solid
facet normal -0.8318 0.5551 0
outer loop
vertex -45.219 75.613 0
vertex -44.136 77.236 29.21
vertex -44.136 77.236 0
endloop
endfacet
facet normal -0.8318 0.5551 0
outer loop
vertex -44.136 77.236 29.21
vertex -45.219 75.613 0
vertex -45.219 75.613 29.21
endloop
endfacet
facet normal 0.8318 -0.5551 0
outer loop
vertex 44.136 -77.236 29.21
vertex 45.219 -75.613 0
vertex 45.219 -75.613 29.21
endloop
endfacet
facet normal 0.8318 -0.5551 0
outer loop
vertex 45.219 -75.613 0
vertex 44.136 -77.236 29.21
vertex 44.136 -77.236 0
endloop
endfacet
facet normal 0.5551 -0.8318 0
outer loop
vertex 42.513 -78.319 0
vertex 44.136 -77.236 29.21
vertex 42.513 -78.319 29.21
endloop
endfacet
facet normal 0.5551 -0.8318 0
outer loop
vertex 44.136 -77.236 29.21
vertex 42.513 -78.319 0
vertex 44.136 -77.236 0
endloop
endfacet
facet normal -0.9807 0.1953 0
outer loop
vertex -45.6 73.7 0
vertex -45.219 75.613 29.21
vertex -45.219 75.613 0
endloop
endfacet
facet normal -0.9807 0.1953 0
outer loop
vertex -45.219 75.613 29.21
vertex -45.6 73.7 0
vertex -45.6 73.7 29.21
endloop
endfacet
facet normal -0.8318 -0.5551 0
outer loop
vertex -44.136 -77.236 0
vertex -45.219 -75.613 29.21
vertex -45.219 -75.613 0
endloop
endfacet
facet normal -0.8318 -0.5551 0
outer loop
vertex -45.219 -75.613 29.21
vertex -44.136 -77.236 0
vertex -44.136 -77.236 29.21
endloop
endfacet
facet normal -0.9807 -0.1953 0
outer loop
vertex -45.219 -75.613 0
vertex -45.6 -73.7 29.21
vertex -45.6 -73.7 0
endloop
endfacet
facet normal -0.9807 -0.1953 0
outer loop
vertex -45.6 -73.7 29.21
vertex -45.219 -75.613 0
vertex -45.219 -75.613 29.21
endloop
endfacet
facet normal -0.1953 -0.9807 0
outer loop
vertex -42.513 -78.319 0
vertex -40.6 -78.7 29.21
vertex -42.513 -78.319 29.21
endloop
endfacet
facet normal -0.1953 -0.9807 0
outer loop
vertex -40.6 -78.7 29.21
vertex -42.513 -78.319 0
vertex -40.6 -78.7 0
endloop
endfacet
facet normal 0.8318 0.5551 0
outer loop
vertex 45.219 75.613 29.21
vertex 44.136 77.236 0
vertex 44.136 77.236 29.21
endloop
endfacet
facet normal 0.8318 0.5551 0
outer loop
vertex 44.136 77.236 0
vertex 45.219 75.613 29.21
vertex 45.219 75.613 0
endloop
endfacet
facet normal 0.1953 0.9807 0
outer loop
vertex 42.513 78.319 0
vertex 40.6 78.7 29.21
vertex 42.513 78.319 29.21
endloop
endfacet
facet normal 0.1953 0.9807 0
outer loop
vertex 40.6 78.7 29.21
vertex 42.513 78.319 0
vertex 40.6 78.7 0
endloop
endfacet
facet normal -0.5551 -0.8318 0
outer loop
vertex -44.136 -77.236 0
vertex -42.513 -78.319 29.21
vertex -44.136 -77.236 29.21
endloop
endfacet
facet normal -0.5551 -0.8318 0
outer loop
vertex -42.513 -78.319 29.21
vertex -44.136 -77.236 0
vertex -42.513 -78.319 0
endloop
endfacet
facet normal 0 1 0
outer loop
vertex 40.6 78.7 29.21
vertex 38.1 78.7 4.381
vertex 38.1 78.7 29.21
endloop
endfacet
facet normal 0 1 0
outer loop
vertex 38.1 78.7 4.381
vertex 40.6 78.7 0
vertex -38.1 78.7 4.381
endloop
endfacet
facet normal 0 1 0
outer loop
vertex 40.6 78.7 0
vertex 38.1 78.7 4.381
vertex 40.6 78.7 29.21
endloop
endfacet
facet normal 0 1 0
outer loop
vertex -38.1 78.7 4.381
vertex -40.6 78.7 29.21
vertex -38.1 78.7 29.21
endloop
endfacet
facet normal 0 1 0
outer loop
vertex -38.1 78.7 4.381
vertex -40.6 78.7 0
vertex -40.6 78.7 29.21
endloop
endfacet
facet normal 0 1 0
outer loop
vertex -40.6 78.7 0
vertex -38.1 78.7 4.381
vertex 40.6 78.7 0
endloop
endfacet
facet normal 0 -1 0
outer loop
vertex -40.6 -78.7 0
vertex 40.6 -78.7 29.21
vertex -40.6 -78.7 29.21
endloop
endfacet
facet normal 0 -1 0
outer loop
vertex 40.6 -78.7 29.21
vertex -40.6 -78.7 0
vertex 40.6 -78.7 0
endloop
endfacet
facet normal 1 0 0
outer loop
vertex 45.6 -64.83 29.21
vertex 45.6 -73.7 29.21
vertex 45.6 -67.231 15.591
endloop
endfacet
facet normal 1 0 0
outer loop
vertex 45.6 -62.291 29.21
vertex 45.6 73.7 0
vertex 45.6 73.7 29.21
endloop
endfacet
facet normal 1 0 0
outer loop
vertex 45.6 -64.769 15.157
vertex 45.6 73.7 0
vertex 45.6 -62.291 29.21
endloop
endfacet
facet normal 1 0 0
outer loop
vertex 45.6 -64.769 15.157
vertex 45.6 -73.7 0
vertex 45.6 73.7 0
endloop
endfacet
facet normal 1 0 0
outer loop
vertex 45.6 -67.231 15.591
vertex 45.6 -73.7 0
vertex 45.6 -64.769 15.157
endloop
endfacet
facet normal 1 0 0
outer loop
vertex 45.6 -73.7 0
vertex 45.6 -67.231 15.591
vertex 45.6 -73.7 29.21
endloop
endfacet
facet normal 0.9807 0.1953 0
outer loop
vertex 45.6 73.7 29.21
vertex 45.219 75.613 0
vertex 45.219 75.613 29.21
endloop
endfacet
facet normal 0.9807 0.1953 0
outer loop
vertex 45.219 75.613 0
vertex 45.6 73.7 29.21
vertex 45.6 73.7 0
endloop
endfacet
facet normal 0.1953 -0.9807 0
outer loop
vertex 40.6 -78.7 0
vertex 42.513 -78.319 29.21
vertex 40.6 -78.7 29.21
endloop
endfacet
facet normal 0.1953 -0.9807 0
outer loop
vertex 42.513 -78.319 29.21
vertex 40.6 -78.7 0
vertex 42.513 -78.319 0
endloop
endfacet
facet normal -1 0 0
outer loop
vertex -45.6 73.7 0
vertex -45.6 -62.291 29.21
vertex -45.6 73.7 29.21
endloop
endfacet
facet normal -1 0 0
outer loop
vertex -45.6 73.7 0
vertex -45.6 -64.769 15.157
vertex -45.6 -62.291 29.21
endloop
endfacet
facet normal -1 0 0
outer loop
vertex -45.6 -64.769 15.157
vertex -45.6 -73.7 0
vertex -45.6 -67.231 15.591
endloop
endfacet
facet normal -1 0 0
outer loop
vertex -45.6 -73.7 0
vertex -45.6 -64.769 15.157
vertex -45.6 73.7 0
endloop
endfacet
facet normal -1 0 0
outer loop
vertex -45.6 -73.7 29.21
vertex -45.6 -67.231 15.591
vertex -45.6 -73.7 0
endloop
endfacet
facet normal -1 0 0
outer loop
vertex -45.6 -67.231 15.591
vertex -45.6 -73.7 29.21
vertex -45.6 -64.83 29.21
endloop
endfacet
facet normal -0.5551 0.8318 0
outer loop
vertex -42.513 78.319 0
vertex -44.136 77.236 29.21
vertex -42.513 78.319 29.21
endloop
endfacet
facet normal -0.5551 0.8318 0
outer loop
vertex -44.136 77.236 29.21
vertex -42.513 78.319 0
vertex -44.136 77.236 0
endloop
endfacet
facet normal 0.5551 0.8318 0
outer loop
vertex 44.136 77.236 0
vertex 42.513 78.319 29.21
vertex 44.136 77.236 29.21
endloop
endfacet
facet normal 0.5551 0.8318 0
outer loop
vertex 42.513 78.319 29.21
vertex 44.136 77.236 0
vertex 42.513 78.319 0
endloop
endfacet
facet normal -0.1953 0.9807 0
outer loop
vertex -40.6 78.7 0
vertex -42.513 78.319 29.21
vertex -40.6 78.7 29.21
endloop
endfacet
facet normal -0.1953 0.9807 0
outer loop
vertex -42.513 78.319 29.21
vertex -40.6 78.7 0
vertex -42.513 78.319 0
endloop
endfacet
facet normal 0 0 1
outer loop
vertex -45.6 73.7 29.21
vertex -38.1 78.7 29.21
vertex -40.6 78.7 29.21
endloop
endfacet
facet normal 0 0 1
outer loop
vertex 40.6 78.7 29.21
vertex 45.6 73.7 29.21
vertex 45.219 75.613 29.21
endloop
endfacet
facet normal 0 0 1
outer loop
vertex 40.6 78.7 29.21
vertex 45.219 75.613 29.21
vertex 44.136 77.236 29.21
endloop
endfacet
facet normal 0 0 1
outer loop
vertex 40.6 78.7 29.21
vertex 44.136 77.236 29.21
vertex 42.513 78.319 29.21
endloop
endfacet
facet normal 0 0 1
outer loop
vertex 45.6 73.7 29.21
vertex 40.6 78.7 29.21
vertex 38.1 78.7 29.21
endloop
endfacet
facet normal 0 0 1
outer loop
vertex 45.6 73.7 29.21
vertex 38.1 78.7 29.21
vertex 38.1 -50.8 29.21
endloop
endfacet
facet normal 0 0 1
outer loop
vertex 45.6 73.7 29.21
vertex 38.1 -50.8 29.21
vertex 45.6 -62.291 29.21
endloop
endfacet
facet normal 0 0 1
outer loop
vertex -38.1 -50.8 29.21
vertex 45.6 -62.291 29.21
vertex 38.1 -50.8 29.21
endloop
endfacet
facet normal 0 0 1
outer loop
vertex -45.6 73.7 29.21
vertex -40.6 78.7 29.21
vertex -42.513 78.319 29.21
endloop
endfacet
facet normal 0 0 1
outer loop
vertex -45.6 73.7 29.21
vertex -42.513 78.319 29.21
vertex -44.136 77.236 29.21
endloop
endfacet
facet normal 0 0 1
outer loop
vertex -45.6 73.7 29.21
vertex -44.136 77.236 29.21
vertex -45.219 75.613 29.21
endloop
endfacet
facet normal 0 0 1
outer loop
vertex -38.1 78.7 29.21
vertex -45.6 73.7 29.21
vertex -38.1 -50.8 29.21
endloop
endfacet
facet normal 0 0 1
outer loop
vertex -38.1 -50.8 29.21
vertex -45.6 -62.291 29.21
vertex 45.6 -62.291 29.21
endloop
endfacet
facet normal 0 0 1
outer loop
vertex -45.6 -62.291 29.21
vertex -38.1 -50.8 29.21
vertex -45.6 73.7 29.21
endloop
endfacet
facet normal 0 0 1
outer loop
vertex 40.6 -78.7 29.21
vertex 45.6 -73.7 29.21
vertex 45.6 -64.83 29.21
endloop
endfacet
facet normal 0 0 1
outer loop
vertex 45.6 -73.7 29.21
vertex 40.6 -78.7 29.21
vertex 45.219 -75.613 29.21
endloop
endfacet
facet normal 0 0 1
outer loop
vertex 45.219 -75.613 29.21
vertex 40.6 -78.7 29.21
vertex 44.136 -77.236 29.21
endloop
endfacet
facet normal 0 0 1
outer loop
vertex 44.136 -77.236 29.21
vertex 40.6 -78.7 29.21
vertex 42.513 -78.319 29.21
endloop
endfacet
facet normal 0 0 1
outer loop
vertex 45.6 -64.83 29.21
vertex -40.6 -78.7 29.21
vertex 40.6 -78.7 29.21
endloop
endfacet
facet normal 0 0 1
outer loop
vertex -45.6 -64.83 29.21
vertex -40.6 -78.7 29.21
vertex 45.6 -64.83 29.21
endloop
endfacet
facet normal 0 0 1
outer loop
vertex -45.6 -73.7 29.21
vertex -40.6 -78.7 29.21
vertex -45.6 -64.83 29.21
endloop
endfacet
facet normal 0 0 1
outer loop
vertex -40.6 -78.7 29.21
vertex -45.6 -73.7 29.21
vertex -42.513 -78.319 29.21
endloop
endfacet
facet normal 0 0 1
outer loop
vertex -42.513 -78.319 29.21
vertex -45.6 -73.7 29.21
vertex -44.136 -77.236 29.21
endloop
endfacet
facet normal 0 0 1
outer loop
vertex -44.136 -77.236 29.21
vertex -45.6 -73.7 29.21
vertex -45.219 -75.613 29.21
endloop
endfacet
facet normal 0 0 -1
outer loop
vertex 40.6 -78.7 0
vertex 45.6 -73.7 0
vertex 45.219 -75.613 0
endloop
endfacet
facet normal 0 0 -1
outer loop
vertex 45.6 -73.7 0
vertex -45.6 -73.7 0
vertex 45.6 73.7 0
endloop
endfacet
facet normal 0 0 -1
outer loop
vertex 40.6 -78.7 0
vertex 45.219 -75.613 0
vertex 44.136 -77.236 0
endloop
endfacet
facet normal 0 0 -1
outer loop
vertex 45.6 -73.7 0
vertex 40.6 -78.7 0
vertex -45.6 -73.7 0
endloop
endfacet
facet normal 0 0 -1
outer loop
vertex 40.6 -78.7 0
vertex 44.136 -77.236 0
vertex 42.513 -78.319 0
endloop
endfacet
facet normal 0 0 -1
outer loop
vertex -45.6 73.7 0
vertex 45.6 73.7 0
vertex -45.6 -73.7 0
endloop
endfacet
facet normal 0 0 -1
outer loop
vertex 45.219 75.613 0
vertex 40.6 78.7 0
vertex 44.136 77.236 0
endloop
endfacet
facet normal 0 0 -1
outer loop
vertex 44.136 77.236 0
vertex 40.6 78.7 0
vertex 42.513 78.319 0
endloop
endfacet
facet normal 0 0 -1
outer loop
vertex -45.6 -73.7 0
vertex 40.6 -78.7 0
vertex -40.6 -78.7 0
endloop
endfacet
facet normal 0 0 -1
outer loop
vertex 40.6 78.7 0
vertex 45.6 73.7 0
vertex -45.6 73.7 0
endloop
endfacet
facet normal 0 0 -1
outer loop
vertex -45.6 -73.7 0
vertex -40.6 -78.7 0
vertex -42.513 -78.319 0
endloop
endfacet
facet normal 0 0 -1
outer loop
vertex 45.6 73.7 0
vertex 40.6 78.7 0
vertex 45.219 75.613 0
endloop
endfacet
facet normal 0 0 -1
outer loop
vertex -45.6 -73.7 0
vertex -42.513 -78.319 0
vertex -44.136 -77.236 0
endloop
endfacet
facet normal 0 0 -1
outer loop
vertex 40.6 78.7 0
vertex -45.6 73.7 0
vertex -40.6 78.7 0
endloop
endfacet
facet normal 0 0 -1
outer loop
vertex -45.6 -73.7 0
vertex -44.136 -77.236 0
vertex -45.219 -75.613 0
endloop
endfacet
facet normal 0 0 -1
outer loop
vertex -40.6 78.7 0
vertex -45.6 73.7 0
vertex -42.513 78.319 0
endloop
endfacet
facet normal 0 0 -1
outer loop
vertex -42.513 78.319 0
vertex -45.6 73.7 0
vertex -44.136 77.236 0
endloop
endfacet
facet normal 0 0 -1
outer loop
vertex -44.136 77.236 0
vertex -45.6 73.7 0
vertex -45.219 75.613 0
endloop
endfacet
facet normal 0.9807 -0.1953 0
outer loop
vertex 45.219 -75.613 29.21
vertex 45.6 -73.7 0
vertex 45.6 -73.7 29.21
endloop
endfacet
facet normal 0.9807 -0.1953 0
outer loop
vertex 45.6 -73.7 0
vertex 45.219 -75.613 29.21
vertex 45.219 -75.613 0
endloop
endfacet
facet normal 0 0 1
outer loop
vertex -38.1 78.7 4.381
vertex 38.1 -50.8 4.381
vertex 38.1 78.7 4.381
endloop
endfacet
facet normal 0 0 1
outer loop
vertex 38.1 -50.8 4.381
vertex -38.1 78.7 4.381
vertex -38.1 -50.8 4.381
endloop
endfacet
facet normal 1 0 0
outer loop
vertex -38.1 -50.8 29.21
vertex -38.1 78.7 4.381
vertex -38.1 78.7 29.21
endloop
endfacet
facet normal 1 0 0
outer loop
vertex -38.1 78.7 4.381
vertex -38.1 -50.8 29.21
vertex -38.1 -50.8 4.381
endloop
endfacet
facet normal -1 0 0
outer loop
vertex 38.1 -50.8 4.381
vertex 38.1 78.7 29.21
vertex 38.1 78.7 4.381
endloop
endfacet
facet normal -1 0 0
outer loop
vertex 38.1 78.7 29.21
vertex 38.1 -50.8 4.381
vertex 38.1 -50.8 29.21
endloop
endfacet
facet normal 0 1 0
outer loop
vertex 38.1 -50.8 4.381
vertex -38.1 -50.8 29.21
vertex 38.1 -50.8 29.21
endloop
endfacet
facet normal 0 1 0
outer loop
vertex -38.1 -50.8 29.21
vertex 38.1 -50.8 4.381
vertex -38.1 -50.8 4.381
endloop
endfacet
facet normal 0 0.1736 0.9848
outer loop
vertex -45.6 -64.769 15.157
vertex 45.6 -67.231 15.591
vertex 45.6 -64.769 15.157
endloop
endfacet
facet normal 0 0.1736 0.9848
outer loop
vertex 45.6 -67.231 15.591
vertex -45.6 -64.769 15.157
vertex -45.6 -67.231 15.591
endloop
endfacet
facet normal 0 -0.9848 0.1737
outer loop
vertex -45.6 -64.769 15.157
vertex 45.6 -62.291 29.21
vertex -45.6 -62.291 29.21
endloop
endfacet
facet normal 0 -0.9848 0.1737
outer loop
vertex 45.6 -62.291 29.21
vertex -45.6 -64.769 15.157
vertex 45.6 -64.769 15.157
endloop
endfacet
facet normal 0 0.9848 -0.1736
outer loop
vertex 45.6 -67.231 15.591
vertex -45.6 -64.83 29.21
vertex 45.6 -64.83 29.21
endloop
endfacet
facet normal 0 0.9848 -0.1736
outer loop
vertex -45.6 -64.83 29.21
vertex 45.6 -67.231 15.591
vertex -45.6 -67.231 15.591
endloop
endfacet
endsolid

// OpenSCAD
mm = 25.4;
card_width_in = 3;
card_height_in = 5;
card_width = card_width_in * mm;
card_height = card_height_in * mm;

width_buffer = 5; // mm on either side of card
height_buffer_in = 1;
height_buffer = height_buffer_in * mm;

full_width = card_width + (2 * width_buffer);
full_height = card_height + height_buffer;

// Card Holder Dimensions: 6.25" x 3.55" x 1.15"
// 3 x 5 cards
depth_z_in = 1.15;
depth_z = depth_z_in * mm;

holder_gap = 2.5;

round_radius = 5;

difference()
{
    linear_extrude(depth_z){
        offset(r = round_radius){square([ full_width - round_radius, full_height - round_radius ], center = true);
}
}
;
translate([ 0, ((height_buffer + round_radius) / 2), (depth_z * 0.15) ]){
    linear_extrude(height = depth_z){square([ card_width, card_height + round_radius ], center = true);
}
}
;
translate([ 0, (-(full_height + round_radius) / 2) + (height_buffer / 2), depth_z / (2 * .95) ])
{
    rotate(a = -10, v = [ 1, 0, 0 ])
    {
        linear_extrude(depth_z / 2)
        {
            square([ full_width + round_radius, holder_gap ], center = true);
        }
    }
}
}
;
